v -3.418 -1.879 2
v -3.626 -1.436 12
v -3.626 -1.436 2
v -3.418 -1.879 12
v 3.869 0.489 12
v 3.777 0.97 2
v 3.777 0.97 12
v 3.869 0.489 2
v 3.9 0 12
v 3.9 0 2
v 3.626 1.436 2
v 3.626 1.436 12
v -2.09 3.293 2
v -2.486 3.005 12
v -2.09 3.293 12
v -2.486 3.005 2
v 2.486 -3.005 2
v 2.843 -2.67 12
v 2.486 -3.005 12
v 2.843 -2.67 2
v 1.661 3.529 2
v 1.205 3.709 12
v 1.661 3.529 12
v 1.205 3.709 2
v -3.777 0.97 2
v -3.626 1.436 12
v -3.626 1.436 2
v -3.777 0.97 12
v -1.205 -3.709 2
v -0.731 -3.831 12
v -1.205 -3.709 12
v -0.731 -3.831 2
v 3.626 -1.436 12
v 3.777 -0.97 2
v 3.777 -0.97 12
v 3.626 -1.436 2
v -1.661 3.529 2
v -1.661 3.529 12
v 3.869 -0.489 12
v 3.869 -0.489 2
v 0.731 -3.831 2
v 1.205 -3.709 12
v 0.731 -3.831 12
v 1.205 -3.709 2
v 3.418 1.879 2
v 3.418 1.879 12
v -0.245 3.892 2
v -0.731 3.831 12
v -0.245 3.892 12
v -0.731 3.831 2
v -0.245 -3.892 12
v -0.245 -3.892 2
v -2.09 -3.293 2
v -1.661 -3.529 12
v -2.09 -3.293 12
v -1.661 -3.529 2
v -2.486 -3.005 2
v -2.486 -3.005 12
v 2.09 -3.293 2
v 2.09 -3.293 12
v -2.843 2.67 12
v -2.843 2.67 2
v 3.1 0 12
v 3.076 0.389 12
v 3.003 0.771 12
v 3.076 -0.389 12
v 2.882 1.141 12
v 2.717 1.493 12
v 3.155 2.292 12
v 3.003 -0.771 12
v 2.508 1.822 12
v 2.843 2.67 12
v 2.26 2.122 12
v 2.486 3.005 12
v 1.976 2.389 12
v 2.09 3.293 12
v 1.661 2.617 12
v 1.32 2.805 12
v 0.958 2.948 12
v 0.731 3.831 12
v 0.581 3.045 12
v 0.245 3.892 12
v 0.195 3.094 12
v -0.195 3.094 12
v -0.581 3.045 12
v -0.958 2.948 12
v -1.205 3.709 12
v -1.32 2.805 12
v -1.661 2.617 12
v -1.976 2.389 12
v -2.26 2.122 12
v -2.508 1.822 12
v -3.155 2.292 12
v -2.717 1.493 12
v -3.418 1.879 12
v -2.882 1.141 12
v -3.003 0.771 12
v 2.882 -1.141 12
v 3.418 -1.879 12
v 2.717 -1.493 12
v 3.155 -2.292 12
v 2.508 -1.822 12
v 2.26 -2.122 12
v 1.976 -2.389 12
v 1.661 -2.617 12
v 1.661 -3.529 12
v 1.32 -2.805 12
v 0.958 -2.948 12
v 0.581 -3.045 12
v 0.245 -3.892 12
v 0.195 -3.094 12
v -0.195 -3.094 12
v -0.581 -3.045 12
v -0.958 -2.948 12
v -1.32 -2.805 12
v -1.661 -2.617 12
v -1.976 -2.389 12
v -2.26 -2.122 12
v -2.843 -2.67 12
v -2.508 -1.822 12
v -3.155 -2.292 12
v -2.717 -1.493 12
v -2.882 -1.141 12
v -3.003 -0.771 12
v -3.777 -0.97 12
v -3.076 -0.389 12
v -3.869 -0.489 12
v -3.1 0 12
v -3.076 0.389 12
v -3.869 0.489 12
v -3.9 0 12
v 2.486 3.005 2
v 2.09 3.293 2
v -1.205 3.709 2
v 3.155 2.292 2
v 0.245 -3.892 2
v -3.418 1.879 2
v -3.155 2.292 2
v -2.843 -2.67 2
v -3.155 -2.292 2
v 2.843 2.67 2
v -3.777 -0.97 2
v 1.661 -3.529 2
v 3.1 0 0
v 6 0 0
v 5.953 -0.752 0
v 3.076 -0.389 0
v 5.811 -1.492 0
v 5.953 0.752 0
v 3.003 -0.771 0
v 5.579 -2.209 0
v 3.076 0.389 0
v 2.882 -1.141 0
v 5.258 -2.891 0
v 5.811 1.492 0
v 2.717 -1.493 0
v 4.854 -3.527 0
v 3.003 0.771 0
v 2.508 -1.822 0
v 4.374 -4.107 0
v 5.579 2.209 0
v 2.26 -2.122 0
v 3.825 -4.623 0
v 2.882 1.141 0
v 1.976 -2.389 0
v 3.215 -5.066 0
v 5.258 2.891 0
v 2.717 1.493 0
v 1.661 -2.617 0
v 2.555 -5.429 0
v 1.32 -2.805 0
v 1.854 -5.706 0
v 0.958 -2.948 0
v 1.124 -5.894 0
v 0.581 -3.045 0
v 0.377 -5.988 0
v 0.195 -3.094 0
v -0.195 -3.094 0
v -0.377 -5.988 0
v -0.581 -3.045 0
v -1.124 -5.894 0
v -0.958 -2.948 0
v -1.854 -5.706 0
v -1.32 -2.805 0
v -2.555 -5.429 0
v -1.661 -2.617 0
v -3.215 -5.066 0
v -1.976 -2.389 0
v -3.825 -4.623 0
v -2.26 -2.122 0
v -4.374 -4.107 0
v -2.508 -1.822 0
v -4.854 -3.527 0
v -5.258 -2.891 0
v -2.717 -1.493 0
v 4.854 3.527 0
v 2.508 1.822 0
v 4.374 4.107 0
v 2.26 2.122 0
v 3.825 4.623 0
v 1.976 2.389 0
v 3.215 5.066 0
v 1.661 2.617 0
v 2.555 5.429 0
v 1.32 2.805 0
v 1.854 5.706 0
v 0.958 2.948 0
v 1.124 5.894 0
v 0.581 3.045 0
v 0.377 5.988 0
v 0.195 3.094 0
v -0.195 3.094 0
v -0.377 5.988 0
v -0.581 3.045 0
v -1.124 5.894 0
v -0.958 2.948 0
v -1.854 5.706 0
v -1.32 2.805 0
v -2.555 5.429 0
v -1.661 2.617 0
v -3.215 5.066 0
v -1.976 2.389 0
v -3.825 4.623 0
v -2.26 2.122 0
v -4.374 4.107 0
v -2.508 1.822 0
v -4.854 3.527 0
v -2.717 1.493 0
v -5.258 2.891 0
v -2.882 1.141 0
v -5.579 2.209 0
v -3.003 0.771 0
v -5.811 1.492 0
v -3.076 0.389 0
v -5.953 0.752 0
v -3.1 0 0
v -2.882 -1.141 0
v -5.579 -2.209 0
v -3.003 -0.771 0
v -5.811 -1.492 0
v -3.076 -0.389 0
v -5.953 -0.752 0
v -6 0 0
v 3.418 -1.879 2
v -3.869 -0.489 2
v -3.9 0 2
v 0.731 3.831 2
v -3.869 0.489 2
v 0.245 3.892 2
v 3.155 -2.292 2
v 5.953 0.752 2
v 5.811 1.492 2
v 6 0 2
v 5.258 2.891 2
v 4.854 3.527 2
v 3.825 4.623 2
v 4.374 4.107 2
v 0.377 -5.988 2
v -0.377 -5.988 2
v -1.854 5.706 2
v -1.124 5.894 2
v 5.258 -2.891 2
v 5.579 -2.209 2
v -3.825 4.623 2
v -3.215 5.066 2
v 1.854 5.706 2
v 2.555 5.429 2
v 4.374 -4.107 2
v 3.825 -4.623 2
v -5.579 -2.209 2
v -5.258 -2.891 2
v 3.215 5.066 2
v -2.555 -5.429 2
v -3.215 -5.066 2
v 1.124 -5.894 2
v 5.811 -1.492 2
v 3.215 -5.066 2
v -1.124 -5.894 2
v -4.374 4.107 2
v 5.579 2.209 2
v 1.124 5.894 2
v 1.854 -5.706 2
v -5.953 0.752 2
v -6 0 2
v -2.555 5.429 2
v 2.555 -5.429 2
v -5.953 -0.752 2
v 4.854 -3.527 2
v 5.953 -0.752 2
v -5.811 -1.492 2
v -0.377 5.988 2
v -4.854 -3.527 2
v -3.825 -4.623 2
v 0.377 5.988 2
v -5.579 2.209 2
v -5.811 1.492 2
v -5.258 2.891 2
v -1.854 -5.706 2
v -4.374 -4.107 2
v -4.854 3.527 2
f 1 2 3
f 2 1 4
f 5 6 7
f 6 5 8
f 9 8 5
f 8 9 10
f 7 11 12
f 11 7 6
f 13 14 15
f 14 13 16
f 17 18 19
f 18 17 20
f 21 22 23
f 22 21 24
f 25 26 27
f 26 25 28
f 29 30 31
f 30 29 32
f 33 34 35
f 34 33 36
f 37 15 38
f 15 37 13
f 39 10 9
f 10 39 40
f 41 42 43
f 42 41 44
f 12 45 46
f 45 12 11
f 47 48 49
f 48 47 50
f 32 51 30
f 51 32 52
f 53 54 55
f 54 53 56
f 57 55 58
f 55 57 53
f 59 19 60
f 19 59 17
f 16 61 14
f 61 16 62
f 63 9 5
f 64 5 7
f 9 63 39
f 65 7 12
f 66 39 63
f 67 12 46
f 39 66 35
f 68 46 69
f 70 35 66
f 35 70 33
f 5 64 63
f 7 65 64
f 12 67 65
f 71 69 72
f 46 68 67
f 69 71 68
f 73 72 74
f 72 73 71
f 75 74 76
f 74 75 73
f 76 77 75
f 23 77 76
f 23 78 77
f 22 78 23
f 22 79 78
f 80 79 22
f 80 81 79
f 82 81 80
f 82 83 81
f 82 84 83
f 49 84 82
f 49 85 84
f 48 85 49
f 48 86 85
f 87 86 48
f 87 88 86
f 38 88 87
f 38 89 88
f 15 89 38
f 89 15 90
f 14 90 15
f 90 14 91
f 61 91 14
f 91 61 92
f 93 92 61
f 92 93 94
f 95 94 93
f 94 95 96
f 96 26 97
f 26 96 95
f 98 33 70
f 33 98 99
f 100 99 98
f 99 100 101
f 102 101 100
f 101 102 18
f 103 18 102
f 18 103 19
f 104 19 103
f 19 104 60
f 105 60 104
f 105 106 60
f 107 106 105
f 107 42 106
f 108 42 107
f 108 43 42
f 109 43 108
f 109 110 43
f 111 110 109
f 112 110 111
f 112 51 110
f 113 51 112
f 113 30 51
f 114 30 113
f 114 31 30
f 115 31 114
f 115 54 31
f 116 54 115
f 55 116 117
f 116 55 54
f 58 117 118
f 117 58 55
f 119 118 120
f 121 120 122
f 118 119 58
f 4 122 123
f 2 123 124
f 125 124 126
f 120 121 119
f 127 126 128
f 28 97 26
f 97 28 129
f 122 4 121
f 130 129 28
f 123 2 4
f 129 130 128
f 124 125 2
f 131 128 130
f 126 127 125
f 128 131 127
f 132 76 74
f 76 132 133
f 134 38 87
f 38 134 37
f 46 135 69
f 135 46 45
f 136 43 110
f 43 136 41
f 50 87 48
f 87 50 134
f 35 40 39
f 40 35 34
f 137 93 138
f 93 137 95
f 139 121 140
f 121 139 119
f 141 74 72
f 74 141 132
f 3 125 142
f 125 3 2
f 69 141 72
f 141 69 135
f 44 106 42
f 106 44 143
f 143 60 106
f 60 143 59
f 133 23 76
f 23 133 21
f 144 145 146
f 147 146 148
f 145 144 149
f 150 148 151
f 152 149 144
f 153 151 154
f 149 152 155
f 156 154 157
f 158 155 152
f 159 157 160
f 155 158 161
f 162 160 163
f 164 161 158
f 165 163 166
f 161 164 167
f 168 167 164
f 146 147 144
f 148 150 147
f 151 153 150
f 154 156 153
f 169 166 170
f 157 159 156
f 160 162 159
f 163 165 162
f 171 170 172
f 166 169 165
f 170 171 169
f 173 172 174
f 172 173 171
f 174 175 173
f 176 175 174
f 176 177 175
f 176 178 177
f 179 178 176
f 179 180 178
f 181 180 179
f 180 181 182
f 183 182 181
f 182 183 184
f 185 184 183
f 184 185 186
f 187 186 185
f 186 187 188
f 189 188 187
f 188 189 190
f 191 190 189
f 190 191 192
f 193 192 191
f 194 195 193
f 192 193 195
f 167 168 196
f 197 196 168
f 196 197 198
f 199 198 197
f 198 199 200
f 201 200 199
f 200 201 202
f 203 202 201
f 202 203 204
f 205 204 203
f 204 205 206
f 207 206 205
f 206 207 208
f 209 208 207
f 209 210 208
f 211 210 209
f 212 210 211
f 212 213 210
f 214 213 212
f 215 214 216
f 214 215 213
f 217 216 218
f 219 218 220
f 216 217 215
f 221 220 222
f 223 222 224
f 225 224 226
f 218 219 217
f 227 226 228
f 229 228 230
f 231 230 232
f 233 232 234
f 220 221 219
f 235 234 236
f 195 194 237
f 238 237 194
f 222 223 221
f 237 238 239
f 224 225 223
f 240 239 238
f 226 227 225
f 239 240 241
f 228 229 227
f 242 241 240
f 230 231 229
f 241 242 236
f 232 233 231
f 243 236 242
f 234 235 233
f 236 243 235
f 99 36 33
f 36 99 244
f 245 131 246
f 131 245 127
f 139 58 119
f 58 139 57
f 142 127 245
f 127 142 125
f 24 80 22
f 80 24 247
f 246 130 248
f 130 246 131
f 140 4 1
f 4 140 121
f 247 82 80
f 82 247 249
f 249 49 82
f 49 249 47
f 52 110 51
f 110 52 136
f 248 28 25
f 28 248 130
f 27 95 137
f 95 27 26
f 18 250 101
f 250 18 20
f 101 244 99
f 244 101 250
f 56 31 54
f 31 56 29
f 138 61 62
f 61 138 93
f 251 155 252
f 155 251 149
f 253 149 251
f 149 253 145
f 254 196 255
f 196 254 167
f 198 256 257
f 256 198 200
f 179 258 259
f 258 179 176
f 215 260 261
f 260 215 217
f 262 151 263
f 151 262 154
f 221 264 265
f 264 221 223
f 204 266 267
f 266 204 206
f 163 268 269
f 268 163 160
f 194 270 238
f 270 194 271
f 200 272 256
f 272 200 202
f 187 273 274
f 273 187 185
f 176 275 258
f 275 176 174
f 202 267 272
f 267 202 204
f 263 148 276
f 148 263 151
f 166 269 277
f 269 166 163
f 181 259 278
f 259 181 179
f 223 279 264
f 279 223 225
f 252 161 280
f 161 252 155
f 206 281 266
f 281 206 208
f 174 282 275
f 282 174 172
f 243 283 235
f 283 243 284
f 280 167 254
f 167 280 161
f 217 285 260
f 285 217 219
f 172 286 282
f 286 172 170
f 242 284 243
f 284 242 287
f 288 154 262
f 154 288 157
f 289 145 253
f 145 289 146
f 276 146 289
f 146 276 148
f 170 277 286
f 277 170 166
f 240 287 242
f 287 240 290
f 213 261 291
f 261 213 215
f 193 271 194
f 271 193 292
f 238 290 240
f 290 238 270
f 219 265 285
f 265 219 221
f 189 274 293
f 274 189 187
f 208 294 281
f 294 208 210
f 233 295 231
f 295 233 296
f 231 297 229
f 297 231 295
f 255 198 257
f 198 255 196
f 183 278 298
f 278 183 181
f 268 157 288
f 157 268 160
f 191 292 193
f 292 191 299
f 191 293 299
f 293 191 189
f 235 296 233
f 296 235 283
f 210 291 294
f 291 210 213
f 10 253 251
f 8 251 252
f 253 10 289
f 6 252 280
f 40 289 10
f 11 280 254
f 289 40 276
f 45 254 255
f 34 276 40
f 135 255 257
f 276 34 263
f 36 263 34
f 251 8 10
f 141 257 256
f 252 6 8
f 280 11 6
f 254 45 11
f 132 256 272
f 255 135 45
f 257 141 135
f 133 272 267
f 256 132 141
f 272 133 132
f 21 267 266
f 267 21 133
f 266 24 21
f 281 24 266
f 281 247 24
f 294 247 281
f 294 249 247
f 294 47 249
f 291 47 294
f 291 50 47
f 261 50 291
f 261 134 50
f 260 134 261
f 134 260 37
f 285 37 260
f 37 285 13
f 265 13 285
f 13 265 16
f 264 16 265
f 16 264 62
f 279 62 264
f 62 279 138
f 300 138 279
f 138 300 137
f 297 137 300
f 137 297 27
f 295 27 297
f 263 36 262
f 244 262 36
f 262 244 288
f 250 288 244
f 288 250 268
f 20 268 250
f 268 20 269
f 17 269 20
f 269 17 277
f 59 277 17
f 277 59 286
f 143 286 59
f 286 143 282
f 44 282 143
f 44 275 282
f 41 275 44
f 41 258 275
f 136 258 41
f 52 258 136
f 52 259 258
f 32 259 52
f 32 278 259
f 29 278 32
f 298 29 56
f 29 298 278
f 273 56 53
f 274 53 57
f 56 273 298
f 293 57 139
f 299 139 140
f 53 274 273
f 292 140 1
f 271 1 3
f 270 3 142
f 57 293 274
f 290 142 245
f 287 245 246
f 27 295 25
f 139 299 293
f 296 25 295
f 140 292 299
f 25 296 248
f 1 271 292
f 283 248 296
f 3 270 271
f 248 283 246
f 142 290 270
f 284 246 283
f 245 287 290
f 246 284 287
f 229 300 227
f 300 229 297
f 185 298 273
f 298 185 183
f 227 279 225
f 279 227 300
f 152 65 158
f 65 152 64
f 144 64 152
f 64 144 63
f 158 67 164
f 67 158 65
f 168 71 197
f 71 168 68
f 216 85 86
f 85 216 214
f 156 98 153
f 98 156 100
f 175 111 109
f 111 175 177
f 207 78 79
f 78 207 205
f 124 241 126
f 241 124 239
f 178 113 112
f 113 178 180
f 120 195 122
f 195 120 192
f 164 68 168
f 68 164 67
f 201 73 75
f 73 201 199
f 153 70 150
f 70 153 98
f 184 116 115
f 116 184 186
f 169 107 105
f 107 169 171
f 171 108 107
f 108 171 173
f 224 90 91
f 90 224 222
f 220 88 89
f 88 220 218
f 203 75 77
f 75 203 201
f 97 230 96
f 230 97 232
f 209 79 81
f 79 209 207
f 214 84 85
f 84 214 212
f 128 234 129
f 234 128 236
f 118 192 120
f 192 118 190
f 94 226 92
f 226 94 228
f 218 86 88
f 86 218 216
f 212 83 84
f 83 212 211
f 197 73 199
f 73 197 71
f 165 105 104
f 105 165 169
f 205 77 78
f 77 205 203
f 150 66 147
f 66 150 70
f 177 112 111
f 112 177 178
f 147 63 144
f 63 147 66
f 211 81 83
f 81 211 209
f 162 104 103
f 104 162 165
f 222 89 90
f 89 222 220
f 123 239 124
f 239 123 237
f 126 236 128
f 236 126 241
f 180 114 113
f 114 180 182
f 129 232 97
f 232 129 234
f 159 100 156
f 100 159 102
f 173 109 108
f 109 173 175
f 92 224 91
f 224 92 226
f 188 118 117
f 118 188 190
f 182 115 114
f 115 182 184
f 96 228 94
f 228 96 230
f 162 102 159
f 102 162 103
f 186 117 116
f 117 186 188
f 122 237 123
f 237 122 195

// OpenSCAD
$fn=50;
ID=6.2;
OD=7.8;
H=10;
BrimOD=12;
BrimT=2;

OAH=H+BrimT;

difference(){
    union(){
        cylinder(h=OAH,d=OD);
        cylinder(h=BrimT,d=BrimOD);
    }
    cylinder(h=OAH,d=ID);
};
